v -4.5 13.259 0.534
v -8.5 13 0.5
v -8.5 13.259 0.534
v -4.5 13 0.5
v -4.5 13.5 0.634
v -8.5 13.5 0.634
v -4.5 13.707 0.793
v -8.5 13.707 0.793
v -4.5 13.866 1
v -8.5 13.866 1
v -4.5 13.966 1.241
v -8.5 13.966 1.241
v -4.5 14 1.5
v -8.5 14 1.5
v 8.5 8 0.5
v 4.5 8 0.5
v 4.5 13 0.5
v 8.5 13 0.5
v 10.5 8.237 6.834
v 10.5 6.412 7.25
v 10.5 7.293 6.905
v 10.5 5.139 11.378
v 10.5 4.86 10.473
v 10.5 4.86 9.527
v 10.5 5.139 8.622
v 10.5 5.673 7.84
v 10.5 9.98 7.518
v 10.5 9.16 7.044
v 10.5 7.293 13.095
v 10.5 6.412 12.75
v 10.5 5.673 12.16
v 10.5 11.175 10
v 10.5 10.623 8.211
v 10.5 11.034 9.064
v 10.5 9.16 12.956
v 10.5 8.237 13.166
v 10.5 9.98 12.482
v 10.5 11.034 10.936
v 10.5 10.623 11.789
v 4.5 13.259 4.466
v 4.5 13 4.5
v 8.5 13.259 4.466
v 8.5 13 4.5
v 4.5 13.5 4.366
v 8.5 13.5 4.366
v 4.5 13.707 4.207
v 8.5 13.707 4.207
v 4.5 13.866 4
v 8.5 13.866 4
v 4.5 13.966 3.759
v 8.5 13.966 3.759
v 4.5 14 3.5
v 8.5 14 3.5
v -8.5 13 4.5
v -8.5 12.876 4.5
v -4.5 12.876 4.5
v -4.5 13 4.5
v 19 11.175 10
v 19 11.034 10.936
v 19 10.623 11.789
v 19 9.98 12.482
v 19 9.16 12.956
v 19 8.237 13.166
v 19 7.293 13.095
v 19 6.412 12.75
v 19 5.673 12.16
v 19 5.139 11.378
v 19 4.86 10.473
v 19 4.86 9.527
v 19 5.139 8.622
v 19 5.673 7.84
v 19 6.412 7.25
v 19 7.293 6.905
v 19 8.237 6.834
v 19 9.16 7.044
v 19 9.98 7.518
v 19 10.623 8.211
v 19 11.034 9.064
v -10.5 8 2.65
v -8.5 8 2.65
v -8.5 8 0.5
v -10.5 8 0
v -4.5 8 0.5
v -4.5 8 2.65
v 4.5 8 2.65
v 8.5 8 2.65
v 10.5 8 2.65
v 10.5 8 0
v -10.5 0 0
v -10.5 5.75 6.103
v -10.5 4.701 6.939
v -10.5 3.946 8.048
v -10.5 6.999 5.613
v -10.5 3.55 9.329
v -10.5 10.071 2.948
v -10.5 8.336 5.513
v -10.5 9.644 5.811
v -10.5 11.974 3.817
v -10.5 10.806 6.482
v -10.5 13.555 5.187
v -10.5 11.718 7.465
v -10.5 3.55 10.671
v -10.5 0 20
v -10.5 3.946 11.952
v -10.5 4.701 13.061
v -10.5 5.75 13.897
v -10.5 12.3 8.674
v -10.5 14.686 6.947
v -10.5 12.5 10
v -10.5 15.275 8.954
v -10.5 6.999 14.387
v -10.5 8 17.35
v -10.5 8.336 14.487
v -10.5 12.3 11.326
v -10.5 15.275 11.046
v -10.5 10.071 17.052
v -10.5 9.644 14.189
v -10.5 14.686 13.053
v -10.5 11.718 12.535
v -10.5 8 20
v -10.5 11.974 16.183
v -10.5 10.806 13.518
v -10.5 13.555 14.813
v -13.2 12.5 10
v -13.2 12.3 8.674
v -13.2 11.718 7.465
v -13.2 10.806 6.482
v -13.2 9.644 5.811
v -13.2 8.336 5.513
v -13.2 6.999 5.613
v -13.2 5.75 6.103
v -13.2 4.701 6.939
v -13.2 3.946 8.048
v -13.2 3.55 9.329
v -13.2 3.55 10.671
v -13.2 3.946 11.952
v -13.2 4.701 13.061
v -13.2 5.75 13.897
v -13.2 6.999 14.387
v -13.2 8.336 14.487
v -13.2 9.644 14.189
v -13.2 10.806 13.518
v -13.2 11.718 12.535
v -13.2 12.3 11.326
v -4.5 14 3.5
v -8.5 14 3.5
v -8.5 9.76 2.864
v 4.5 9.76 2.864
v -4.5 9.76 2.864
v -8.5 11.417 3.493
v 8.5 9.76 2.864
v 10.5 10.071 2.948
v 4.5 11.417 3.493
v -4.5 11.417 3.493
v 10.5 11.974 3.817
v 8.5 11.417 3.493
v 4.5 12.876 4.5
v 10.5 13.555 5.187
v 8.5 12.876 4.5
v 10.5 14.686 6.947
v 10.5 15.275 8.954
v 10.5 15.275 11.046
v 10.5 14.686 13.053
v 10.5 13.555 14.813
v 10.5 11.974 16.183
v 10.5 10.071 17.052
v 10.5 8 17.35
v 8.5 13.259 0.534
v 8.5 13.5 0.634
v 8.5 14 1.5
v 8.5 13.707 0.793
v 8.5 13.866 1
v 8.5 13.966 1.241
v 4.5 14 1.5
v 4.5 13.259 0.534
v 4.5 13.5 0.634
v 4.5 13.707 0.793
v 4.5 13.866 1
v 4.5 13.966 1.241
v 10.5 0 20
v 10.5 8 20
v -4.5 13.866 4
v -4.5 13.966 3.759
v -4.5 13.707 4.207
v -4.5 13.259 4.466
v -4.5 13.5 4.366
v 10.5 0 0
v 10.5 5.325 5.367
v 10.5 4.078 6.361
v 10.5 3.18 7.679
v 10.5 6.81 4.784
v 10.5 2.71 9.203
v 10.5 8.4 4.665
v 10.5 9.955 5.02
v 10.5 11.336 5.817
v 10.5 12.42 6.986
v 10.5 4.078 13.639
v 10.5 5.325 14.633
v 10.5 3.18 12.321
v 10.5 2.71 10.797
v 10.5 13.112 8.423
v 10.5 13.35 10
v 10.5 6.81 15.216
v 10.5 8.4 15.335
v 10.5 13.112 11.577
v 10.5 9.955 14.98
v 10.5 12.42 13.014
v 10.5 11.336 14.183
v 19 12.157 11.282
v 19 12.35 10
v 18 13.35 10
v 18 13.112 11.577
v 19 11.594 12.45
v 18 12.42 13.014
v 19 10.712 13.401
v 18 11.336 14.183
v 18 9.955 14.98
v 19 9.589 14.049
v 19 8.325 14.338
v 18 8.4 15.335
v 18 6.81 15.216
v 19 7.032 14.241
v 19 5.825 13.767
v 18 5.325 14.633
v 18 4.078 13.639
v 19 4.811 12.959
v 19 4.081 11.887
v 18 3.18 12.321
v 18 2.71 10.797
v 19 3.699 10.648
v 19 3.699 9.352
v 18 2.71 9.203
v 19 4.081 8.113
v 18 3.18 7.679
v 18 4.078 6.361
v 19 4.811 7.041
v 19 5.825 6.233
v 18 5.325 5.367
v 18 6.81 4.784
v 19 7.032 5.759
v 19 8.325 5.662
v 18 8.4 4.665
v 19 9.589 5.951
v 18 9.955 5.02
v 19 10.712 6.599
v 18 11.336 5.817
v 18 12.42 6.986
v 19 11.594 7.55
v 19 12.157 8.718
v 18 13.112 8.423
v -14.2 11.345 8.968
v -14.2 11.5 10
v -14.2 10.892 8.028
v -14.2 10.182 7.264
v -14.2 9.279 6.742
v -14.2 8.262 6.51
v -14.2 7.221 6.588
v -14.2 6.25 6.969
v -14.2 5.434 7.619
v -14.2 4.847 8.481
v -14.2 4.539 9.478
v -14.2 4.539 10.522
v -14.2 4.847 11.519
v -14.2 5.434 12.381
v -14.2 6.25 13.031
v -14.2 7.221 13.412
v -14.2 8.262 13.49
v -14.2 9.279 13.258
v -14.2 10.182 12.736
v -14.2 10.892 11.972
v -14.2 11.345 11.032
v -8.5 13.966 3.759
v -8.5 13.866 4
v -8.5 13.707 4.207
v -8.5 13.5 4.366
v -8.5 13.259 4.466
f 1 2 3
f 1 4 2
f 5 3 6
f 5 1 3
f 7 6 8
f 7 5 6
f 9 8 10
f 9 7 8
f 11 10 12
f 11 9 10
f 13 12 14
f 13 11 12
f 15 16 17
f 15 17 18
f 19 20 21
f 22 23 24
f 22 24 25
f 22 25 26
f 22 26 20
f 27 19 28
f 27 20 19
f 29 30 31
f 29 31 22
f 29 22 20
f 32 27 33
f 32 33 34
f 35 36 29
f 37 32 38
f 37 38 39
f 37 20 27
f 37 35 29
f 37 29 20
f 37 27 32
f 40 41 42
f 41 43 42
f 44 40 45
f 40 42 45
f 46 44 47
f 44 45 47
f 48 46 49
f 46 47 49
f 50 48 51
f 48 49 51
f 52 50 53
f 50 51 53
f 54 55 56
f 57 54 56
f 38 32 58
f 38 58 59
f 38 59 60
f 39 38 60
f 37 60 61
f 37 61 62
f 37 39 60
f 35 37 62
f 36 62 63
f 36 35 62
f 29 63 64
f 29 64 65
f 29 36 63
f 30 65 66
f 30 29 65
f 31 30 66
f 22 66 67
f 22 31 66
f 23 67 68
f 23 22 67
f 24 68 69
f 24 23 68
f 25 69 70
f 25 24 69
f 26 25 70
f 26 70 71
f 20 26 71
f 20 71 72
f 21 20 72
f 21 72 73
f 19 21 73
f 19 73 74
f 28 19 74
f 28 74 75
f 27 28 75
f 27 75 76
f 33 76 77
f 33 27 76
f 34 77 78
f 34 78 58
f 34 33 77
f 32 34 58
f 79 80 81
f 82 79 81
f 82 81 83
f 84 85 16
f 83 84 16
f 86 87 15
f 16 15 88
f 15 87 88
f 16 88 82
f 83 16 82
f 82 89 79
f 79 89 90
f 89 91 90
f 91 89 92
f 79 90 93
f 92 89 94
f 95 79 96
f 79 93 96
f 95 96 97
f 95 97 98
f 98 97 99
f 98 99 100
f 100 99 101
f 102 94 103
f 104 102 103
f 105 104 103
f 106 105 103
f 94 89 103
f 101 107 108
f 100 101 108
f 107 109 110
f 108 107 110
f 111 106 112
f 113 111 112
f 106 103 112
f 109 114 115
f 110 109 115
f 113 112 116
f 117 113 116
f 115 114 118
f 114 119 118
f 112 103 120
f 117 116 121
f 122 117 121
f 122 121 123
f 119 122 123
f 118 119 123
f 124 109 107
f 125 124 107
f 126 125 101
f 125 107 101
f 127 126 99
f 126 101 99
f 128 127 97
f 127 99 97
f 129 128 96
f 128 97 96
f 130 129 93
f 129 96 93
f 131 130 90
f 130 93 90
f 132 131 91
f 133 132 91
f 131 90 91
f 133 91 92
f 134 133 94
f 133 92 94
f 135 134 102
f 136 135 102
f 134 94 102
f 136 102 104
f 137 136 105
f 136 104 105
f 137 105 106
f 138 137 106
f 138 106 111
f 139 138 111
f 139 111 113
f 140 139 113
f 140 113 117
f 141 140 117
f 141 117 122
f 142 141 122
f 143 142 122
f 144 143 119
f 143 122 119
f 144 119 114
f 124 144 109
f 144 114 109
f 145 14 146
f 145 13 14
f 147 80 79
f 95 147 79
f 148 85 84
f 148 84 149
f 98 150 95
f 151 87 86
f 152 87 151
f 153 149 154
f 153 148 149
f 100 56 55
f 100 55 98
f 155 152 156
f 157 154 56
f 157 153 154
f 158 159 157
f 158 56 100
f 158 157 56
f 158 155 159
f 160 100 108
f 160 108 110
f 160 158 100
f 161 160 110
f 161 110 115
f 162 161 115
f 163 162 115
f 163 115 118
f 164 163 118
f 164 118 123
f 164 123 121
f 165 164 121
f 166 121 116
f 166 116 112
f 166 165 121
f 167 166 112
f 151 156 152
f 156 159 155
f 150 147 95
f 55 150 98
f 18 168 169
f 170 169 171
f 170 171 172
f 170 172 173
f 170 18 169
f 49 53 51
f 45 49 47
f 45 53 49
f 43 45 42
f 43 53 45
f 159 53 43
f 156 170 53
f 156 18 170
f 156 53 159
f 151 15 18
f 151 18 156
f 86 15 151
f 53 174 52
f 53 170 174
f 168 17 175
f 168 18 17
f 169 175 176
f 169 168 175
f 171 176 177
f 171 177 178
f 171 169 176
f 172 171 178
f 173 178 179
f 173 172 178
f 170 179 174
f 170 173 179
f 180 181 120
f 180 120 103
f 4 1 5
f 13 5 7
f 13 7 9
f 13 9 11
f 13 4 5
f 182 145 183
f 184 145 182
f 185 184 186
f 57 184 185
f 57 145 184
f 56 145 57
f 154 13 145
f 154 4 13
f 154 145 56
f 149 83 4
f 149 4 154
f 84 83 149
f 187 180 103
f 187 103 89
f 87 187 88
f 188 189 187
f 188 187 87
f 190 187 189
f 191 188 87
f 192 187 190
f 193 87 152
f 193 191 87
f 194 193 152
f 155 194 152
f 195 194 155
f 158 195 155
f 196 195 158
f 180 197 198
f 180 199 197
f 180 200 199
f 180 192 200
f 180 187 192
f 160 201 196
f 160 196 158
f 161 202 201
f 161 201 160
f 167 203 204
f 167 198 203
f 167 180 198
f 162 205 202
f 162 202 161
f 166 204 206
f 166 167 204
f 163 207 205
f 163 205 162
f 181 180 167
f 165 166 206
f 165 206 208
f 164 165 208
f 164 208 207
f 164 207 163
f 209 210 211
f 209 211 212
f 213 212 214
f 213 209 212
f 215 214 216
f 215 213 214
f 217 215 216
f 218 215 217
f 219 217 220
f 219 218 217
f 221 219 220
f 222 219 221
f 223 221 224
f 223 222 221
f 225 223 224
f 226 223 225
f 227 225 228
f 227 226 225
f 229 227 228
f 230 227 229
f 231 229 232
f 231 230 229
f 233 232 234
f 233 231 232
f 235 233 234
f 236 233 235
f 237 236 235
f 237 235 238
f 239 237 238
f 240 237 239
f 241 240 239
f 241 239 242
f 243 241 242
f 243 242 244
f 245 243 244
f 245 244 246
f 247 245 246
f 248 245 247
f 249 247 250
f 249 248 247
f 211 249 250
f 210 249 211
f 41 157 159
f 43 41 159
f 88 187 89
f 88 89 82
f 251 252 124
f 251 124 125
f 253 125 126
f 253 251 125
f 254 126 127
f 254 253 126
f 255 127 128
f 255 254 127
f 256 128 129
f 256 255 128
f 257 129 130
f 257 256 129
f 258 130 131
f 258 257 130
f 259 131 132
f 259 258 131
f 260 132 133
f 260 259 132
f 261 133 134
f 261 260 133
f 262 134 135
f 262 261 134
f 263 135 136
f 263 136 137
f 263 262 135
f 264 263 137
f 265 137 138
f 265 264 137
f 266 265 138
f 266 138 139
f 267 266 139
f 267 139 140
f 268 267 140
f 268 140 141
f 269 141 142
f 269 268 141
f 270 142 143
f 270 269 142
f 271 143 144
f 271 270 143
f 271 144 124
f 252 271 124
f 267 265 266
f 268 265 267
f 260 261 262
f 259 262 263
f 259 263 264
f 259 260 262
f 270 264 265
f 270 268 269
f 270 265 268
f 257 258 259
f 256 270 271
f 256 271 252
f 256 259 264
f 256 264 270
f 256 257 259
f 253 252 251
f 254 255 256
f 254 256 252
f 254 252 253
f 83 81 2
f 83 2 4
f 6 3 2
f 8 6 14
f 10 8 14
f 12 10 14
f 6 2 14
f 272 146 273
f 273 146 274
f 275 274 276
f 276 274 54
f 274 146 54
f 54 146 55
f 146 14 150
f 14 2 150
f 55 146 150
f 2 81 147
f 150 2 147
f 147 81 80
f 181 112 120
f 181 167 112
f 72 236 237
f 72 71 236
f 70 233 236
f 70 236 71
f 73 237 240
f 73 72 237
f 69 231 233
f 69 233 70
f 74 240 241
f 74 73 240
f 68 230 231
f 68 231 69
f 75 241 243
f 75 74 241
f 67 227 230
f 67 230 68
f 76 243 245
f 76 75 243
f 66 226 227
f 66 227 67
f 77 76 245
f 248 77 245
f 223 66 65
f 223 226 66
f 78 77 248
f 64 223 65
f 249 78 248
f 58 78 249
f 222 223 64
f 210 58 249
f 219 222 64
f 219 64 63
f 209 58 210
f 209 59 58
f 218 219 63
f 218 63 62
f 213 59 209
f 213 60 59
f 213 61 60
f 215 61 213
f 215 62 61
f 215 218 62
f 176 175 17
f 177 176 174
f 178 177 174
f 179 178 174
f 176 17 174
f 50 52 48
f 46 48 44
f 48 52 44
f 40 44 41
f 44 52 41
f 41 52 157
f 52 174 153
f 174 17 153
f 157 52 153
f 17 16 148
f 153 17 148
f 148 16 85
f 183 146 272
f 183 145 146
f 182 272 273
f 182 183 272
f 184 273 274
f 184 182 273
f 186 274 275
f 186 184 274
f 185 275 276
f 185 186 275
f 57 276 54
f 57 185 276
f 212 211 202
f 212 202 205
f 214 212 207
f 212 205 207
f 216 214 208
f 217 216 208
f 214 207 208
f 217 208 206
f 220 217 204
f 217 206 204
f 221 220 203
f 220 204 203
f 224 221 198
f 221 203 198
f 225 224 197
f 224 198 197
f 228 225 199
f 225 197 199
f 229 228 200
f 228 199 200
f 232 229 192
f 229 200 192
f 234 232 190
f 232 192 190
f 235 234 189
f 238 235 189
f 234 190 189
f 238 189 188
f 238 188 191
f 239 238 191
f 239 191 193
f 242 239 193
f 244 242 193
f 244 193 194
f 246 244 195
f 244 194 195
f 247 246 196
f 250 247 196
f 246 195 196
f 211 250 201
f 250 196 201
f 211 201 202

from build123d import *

# Parameters (mm, degrees)
PAD001_DEPTH  = 10.5
SKETCH002_R   = 5.35
SKETCH002_R_2 = 3.175
PAD002_DEPTH  = 8.5
SKETCH003_R   = 4.5
PAD003_DEPTH  = 3.7
CHAMFER_SIZE  = 1
SKETCH006_W   = 4
SKETCH006_H   = 4
PAD005_DEPTH  = 6
FILLET_R      = 1


with BuildPart() as part:
    # Sketch001 → Pad001 (new body, symmetric)
    with BuildSketch(Plane.YZ):
        with BuildLine():
            Line((8, 17.35), (8, 20))
            Line((8, 20), (0, 20))
            Line((0, 20), (0, 0))
            Line((0, 0), (8, 0))
            Line((8, 2.65), (8, 0))
            ThreePointArc((8, 2.65), (15.35, 10), (8, 17.35))
        make_face()
    extrude(amount=PAD001_DEPTH, both=True)

    # Sketch002 (on Face8 of Pad001) → Pad002 (join)
    with BuildSketch(Plane.YZ.offset(10.5)):
        with Locations((8, 10)):
            Circle(SKETCH002_R)
        with Locations((8, 10)):
            Circle(SKETCH002_R_2, mode=Mode.SUBTRACT)
    extrude(amount=PAD002_DEPTH)

    # Sketch003 (on Face4 of Pad002) → Pad003 (join)
    with BuildSketch(Plane(origin=(-10.5, 0, 0), x_dir=(0, 1, 0), z_dir=(-1, 0, 0))):
        with Locations((8, -10)):
            Circle(SKETCH003_R)
    extrude(amount=PAD003_DEPTH)

    # Chamfer
    chamfer_edges = [part.edges().sort_by_distance(p)[0] for p in [
        (-14.2, 3.5, 10),
        (19, 2.65, 10),
    ]]
    chamfer(chamfer_edges, length=CHAMFER_SIZE)

    # Sketch006 (on Face6 of Chamfer) → Pad005 (join)
    with BuildSketch(Plane.ZX.offset(8)):
        with Locations((2.5, -6.5)):
            Rectangle(SKETCH006_W, SKETCH006_H)
        with Locations((2.5, 6.5)):
            Rectangle(SKETCH006_W, SKETCH006_H)
    extrude(amount=PAD005_DEPTH)

    # Fillet
    fillet_edges = [part.edges().sort_by_distance(p)[0] for p in [
        (-6.5, 14, 0.5),
        (6.5, 14, 0.5),
        (-6.5, 14, 4.5),
        (6.5, 14, 4.5),
    ]]
    fillet(fillet_edges, radius=FILLET_R)


solid = part.part
